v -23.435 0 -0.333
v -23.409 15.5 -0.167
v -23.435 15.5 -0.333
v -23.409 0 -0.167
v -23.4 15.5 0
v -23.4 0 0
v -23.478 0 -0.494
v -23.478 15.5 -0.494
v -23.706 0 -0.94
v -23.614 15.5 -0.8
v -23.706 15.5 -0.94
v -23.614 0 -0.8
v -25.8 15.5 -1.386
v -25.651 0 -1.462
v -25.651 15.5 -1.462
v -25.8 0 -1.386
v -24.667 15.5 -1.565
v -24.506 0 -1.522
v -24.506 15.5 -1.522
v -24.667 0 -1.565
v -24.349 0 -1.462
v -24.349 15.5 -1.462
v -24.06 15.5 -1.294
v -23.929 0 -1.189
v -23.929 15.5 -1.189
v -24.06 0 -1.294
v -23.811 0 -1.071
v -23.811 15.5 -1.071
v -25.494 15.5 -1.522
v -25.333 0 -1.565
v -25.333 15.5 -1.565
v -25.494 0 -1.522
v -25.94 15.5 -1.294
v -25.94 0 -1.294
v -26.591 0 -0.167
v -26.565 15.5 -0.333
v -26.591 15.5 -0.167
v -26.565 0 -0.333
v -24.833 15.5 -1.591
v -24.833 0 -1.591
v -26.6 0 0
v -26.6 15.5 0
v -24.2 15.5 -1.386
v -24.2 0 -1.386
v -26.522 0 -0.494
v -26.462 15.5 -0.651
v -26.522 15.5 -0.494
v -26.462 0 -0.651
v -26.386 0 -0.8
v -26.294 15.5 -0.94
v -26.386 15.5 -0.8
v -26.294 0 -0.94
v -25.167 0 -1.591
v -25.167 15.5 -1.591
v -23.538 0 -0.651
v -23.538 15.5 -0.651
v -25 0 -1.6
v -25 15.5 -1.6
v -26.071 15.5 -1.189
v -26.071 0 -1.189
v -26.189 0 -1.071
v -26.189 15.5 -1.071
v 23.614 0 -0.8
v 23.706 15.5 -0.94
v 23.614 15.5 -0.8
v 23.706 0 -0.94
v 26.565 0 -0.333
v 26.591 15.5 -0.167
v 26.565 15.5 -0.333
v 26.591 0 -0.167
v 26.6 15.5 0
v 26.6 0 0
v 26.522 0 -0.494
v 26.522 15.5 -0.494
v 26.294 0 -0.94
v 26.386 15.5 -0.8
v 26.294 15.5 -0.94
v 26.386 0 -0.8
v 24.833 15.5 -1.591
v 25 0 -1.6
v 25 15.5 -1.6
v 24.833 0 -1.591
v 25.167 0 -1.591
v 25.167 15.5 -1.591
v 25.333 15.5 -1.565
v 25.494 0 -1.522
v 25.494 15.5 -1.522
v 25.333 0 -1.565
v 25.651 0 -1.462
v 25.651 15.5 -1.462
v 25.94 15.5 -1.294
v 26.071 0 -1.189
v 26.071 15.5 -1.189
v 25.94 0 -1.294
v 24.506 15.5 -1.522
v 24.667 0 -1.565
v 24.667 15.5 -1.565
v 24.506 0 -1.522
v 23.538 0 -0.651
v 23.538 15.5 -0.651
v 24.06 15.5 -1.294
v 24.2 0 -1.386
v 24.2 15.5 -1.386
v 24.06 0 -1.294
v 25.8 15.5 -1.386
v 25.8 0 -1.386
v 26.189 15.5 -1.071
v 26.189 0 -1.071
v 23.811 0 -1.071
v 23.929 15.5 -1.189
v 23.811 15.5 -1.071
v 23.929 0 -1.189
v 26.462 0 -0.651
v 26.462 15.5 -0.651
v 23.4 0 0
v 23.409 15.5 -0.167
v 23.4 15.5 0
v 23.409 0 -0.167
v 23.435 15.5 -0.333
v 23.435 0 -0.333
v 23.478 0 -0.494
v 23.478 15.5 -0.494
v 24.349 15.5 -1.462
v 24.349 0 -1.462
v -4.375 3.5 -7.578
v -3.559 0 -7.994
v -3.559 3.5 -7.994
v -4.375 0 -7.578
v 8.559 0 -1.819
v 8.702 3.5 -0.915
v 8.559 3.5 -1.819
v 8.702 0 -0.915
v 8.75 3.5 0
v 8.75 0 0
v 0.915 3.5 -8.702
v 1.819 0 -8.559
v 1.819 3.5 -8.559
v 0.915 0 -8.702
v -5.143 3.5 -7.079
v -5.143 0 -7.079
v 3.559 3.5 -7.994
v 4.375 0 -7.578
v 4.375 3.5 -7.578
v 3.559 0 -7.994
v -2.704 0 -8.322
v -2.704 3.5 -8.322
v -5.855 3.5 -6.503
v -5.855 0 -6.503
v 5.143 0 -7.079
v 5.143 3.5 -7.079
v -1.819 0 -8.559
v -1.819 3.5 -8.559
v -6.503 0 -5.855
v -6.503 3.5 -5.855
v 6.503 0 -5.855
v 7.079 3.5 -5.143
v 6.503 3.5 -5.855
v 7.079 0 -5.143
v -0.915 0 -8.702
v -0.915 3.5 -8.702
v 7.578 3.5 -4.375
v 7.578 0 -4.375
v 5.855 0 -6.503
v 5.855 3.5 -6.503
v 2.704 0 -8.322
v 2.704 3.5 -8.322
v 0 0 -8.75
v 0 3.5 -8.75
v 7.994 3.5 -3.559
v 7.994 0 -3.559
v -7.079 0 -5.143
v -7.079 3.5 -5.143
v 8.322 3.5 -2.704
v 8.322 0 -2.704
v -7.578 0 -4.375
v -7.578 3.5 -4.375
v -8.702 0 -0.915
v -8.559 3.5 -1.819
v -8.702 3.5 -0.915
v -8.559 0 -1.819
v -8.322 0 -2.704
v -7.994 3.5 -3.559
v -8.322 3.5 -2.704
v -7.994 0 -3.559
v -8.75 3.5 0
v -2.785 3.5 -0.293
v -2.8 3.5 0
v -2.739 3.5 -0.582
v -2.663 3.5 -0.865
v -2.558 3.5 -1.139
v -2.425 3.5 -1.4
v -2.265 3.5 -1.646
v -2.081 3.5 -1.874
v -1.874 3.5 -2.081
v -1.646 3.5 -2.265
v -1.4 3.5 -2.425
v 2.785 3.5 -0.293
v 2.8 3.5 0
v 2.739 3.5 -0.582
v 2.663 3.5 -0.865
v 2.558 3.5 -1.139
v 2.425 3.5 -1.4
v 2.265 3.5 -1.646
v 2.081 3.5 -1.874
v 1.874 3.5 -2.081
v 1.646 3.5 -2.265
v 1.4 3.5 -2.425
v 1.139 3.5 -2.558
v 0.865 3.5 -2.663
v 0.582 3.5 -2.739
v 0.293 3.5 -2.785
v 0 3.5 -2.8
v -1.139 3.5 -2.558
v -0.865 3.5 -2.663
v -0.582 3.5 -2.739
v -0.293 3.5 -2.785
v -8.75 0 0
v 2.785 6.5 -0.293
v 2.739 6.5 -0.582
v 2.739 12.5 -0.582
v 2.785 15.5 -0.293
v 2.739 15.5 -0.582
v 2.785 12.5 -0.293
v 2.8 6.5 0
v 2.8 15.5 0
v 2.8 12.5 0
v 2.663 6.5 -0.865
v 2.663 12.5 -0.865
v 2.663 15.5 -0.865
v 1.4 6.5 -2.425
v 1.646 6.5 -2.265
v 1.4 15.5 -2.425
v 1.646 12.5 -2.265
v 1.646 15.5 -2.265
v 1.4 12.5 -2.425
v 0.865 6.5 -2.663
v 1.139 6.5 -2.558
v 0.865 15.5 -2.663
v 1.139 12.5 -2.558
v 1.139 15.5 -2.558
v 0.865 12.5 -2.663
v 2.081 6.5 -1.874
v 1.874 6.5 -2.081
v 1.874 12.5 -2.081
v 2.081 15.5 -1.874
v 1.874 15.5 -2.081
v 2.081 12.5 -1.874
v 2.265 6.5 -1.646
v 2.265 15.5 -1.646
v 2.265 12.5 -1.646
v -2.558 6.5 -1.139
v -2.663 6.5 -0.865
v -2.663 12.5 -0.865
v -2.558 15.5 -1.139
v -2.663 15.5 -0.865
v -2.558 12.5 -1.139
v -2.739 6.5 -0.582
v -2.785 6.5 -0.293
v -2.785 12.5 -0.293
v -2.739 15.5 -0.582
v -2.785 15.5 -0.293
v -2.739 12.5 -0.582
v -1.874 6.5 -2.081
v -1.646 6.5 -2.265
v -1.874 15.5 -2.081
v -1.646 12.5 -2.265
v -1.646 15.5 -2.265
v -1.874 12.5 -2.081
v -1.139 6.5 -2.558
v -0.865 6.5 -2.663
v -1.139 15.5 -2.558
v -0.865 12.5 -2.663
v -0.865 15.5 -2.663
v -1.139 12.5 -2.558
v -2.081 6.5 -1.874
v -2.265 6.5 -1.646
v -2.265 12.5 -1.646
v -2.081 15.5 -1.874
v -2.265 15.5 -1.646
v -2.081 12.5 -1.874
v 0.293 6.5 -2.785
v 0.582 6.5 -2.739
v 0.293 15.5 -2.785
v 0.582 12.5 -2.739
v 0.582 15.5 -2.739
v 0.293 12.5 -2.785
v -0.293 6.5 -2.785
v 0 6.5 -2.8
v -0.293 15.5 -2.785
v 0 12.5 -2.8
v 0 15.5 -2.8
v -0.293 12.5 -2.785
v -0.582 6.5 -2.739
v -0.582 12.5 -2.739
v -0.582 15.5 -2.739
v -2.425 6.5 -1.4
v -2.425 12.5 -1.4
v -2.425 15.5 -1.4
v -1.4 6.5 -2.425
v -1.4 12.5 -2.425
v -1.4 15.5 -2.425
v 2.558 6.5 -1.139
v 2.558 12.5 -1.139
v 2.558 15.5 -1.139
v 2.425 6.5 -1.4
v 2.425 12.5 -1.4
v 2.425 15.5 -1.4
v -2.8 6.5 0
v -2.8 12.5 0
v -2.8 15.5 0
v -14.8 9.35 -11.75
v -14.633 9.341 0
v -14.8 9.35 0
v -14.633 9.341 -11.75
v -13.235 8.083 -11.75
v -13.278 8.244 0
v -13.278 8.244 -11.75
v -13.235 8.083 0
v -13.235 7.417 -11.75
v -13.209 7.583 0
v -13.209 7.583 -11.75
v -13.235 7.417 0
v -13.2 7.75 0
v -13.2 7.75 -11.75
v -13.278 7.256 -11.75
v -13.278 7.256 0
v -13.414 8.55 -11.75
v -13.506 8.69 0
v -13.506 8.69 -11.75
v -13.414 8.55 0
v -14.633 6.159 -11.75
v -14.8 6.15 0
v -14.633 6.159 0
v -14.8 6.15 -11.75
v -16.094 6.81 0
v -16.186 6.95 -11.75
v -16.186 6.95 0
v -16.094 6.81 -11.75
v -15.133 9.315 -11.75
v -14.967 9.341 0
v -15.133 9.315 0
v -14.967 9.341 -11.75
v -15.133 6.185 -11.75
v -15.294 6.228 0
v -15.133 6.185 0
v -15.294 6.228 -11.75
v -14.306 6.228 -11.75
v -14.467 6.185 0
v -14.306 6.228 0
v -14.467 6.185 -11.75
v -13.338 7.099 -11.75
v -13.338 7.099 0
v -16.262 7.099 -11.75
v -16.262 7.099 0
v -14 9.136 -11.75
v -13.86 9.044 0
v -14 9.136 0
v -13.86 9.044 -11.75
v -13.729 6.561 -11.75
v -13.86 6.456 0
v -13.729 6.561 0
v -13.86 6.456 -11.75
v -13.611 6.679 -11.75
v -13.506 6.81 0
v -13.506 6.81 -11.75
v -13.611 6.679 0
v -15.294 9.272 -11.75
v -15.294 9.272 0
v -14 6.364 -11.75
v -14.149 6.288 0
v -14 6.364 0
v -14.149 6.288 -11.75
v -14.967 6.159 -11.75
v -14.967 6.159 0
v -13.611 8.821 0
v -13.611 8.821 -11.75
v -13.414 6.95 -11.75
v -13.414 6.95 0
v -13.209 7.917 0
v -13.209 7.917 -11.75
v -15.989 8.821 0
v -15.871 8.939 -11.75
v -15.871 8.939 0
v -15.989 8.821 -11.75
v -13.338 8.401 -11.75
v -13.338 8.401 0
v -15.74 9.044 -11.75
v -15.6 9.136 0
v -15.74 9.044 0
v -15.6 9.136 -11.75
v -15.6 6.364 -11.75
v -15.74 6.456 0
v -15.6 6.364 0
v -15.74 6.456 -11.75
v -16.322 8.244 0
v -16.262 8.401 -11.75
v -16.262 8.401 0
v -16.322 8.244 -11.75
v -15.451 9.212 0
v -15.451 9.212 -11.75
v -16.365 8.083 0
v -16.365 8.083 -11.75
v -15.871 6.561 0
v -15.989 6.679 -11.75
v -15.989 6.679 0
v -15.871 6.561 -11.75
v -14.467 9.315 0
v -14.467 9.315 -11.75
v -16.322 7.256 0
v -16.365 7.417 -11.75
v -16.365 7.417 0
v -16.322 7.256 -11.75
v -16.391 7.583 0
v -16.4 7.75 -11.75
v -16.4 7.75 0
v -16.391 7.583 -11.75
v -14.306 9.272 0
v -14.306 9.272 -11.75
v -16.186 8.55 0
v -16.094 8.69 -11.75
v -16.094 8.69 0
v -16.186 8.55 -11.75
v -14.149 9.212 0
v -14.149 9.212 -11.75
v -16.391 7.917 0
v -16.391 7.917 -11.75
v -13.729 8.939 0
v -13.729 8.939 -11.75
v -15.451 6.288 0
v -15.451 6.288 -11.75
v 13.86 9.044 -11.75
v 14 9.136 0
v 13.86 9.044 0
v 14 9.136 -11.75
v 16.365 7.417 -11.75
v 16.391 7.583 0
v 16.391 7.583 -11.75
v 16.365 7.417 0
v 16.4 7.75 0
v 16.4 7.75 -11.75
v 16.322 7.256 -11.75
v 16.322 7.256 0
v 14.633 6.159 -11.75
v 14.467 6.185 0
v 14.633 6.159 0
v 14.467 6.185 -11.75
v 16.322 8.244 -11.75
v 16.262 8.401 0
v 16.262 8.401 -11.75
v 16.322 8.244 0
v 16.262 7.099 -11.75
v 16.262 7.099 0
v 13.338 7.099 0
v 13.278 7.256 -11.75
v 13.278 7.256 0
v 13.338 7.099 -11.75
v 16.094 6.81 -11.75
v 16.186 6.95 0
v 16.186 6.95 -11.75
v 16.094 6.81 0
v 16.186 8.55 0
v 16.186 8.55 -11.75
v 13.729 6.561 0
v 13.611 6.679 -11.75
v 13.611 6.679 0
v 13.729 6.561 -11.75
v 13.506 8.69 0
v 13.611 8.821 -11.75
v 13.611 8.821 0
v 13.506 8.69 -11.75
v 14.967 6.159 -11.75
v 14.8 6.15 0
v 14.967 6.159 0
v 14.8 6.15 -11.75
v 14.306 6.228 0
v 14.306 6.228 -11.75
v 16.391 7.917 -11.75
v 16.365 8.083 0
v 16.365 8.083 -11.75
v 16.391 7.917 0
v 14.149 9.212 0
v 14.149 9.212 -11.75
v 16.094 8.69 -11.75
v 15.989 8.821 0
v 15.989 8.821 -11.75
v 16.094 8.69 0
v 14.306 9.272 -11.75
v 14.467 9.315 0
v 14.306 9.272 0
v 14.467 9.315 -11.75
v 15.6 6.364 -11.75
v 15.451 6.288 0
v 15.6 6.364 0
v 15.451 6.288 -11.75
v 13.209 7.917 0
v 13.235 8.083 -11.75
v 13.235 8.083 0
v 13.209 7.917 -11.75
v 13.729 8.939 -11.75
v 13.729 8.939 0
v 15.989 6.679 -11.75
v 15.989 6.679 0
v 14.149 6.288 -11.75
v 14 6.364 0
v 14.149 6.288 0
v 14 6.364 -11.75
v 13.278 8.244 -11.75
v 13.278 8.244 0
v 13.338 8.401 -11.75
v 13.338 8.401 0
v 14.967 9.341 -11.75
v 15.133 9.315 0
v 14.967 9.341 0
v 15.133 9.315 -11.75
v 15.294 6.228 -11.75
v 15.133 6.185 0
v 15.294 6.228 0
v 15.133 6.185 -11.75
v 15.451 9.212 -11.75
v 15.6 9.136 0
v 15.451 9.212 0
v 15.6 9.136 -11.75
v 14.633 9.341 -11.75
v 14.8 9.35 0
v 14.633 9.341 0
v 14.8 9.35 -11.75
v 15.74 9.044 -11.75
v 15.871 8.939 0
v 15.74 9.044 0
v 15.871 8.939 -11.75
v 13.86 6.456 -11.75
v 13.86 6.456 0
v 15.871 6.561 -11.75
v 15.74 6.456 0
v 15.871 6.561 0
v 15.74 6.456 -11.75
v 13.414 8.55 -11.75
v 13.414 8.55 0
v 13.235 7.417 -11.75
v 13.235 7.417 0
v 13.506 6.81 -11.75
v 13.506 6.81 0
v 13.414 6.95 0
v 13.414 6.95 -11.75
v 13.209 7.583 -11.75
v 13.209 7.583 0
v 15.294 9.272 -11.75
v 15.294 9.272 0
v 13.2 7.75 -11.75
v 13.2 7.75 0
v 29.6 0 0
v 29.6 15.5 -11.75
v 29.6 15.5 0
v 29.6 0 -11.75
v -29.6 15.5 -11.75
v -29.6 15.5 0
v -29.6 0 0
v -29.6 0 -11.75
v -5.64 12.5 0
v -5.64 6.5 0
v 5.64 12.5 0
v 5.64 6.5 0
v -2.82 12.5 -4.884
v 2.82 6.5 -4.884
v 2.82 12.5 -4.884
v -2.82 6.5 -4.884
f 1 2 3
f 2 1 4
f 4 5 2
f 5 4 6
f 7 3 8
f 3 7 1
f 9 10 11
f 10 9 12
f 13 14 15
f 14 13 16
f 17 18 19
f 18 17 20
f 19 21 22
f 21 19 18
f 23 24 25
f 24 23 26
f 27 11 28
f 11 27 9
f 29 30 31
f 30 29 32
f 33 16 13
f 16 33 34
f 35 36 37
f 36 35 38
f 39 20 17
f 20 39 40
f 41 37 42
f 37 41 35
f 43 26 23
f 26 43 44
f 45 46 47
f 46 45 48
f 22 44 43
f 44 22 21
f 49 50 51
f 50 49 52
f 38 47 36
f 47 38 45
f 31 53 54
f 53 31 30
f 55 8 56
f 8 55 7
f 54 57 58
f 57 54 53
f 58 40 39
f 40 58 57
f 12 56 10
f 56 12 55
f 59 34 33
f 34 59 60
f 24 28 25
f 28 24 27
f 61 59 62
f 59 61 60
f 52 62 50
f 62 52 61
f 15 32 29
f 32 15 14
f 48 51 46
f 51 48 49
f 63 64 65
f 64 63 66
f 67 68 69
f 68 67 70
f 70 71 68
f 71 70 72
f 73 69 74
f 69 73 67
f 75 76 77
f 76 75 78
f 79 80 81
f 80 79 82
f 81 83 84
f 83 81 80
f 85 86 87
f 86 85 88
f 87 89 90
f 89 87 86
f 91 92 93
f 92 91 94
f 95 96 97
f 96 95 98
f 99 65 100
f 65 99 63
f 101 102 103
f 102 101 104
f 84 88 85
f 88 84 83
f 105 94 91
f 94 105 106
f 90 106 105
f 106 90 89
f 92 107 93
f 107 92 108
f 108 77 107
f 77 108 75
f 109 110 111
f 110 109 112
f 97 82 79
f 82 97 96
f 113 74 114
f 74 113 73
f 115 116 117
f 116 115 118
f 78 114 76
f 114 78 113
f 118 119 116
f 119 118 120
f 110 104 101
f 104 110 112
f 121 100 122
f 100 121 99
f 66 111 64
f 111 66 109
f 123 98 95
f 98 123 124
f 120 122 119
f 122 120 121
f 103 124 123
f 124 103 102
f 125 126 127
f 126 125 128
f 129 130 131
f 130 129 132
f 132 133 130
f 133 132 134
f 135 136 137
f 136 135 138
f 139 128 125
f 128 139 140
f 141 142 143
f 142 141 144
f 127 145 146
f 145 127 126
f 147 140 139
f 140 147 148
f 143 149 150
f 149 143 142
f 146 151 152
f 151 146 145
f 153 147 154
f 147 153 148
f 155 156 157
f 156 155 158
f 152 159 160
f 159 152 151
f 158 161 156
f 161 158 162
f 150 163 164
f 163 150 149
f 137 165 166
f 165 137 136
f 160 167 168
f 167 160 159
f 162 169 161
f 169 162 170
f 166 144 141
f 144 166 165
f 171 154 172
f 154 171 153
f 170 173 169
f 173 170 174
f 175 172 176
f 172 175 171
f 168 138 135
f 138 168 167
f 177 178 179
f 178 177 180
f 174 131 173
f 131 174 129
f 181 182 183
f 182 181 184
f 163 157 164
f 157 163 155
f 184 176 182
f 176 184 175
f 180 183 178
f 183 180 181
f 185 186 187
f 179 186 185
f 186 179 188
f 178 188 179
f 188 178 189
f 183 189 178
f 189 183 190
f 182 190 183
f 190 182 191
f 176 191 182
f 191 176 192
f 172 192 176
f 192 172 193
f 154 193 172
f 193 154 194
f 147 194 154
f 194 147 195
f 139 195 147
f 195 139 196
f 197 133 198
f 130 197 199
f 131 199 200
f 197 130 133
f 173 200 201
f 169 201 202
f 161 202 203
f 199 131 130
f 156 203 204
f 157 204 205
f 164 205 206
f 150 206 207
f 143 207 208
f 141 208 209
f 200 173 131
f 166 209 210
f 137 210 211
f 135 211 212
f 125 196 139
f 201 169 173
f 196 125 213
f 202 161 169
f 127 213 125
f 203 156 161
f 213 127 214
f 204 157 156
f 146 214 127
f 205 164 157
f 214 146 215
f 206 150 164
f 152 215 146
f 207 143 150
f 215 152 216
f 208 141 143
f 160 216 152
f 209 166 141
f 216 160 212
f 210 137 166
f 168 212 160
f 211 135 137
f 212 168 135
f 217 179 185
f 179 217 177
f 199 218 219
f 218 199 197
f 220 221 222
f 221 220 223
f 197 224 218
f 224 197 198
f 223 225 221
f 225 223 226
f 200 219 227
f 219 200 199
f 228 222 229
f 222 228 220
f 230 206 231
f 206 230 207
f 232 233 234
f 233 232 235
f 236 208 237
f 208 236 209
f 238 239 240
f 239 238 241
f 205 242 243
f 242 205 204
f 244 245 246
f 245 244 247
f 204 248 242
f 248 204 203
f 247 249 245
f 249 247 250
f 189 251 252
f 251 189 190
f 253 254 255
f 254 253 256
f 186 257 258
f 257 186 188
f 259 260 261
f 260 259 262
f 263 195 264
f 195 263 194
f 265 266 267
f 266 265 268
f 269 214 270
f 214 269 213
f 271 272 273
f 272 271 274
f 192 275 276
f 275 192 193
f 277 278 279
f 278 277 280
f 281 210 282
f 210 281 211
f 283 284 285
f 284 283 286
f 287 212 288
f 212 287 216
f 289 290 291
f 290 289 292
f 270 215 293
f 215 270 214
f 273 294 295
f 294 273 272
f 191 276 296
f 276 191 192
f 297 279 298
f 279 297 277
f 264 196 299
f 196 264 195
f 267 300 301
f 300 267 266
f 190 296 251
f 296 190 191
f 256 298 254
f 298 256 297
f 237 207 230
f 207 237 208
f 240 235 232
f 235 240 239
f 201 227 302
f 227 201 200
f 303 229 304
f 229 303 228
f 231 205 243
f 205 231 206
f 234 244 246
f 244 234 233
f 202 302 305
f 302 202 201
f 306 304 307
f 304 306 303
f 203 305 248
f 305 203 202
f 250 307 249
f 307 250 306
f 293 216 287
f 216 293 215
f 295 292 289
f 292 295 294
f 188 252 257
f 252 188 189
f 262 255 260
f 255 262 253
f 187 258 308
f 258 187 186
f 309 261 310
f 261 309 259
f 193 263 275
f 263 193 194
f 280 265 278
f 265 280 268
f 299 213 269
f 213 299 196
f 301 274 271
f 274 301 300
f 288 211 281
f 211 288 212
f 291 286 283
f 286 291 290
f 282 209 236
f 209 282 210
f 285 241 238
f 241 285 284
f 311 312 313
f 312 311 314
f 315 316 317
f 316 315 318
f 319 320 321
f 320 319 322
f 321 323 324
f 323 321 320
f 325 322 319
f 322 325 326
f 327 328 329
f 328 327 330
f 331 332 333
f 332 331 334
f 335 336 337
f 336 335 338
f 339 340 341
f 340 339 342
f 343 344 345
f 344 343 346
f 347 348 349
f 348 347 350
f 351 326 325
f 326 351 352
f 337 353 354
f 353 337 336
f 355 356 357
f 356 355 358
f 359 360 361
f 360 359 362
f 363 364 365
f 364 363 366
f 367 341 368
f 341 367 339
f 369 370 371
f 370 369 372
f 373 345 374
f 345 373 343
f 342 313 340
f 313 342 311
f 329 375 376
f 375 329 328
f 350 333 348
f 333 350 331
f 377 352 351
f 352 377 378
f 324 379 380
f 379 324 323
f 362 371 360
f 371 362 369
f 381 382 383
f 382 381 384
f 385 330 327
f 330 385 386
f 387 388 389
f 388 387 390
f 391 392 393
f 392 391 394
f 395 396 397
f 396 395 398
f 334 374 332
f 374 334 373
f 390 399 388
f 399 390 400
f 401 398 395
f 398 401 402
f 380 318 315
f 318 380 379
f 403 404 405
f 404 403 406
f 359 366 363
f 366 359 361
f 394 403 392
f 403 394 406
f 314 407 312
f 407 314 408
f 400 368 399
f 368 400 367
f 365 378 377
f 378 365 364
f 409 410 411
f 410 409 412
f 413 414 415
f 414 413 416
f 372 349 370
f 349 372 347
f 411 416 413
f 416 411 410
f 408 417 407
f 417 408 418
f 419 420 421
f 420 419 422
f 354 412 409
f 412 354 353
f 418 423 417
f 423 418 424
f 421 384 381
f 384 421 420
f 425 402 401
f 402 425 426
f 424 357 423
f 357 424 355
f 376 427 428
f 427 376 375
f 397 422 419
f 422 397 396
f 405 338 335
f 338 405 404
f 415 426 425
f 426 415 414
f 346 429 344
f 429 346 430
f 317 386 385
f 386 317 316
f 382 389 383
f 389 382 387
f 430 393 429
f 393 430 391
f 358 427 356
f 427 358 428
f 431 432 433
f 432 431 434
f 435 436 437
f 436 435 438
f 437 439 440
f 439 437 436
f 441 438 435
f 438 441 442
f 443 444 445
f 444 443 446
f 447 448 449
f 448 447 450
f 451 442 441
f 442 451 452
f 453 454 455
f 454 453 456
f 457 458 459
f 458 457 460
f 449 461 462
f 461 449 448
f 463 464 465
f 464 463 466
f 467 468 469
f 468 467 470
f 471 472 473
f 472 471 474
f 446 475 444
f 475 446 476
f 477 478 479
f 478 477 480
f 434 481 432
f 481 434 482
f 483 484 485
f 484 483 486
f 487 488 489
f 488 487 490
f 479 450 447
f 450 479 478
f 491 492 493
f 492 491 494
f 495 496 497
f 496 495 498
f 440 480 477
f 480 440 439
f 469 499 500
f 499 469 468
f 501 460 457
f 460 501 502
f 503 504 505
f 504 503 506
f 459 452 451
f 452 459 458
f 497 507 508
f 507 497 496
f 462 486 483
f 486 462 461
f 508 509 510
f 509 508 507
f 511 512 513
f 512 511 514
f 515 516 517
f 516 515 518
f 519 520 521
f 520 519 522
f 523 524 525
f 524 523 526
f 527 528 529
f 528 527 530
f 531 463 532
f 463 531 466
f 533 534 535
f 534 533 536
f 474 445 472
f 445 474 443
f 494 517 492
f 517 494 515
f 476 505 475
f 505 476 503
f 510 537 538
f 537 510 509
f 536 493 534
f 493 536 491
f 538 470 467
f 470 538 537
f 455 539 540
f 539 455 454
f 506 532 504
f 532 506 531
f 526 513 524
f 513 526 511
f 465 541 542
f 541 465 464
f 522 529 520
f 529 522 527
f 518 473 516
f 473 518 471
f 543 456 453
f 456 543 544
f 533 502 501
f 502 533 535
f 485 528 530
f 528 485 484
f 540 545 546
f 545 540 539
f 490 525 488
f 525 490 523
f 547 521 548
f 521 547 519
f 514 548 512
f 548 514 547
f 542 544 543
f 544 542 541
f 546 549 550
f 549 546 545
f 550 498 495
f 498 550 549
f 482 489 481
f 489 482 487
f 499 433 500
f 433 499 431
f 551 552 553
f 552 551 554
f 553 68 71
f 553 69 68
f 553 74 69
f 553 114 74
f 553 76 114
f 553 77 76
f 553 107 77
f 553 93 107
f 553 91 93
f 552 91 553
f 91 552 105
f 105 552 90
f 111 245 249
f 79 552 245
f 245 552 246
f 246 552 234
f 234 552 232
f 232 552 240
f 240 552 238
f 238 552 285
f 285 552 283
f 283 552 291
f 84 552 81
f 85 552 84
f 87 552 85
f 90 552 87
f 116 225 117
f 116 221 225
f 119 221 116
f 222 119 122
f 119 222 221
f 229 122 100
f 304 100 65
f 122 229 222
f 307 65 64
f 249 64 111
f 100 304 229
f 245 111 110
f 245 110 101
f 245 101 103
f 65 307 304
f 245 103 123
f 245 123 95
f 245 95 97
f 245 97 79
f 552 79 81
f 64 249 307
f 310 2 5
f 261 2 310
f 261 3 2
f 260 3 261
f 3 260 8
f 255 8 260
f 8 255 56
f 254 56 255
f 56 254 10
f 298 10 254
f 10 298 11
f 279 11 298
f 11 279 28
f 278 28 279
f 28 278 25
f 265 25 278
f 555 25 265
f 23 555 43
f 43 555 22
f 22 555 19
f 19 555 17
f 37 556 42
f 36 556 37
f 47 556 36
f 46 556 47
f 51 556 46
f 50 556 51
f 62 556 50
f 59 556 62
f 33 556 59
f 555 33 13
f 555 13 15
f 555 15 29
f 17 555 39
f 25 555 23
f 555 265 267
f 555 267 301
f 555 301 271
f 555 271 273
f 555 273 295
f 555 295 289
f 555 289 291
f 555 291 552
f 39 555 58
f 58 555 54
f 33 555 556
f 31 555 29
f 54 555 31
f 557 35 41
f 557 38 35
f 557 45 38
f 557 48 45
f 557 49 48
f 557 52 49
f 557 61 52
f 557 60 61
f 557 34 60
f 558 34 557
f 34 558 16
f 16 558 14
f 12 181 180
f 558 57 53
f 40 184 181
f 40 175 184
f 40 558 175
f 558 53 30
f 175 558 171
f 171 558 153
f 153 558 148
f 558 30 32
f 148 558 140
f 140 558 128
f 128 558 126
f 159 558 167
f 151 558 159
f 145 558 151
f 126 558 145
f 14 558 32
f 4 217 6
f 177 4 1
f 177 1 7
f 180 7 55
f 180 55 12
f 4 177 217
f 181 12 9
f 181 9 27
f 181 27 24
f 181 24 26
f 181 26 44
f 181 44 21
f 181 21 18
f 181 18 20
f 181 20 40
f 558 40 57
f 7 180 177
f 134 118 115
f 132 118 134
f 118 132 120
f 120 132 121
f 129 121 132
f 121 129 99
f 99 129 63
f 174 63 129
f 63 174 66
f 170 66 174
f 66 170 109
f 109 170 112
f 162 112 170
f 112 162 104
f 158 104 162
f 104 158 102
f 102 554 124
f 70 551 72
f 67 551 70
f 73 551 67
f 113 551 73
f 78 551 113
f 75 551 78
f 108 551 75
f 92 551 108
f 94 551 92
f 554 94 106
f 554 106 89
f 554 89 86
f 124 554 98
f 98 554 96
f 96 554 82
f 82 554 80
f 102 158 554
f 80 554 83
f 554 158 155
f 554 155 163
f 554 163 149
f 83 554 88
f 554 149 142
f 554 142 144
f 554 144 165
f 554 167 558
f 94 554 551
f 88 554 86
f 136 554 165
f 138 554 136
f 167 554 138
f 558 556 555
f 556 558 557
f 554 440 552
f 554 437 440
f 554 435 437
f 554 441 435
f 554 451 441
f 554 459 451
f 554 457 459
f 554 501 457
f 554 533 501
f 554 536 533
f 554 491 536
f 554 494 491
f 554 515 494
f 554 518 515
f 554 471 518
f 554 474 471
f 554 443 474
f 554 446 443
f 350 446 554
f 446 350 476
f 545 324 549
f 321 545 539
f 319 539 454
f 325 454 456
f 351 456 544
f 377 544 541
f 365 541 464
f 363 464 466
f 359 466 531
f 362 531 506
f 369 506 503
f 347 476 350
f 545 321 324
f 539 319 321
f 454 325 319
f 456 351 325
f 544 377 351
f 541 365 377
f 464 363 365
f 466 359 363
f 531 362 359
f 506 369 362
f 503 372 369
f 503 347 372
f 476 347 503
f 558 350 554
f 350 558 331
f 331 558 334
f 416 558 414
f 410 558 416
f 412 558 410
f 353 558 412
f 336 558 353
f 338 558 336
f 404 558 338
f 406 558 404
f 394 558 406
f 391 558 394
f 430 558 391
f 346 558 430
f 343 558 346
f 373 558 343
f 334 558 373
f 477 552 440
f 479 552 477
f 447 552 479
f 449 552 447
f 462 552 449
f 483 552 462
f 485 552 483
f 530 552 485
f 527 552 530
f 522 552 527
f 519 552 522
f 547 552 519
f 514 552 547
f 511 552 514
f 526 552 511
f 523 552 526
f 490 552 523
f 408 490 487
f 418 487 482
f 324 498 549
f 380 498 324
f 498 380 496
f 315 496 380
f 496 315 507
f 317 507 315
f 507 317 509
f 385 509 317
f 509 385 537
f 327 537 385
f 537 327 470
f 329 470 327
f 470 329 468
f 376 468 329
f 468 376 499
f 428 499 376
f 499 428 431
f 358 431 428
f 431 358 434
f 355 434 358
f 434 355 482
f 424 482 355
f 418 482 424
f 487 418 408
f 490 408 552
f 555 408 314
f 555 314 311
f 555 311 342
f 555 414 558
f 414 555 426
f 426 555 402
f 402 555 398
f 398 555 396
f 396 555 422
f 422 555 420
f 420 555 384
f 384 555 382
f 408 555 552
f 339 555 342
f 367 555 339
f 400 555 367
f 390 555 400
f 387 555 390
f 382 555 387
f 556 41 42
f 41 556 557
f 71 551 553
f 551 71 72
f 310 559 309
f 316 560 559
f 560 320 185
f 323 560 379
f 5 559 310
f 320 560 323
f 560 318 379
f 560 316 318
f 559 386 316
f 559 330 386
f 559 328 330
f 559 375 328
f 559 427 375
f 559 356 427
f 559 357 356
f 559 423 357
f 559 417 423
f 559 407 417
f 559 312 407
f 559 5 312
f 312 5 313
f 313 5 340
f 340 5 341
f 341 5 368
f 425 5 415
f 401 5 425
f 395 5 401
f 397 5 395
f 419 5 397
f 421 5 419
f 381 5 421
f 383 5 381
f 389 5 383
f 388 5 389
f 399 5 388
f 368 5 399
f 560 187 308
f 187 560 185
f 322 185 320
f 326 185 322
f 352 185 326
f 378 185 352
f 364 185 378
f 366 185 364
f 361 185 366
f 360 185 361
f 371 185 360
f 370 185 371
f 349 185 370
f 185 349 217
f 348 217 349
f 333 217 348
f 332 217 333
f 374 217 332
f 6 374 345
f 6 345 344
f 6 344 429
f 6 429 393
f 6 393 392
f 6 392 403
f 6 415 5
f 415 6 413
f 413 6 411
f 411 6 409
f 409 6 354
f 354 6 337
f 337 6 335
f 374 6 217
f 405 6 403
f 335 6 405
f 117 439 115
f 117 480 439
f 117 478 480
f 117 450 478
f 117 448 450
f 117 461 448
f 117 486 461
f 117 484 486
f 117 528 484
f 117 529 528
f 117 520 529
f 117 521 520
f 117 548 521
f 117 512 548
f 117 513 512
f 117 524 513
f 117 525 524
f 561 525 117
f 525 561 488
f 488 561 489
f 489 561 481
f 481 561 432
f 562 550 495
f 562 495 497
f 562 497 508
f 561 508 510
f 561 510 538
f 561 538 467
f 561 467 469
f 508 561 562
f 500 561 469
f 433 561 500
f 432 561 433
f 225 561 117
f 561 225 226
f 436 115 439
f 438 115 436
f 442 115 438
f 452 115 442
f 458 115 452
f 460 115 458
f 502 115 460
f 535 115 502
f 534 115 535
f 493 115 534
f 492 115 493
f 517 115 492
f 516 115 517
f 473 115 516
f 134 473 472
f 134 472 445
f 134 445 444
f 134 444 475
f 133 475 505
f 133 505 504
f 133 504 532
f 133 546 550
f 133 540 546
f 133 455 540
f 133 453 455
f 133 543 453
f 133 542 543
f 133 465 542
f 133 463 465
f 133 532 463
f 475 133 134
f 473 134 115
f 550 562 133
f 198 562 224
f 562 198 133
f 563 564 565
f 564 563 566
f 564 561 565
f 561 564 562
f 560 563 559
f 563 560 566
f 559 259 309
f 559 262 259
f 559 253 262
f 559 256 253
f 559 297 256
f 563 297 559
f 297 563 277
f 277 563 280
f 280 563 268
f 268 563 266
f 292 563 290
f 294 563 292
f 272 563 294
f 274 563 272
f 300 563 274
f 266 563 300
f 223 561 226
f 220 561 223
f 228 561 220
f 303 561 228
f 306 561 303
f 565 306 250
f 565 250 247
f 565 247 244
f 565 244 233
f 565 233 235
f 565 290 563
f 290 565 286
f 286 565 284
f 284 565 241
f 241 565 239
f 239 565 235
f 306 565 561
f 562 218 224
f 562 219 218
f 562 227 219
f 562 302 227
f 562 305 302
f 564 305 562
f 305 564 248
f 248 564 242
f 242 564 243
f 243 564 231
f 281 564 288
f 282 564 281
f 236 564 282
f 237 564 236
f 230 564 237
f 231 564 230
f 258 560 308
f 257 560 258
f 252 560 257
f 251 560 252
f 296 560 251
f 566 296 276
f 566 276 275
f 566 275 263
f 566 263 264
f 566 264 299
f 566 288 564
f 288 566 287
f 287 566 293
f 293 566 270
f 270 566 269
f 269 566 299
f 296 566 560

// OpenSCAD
/*
 * TVRRUG hotend cable mount
 *
 * Copyright 2012 <b@Zi.iS>
 * License CC BY 3.0
 */

/*
 * Serendipitously you can just run an M6 nyloc nut onto the end of the PTFE
 * tube for a perfect grip
 */

$fn = 60;

m3 = 3.2 /2;
m6_nyloc = [
	11.28 /2,
	6
];

rotate([
	-90,
	0,
	0
]) {
	mount();
}

module mount(
	bolt = m3,
	pitch = 50,
	bowden = 5.6/2,
	bowden_nut = m6_nyloc,
	hotend = [17.5/2, 3.5],
	t = 3
) {
	size = [
		pitch + bolt*2 + t*2,
		hotend[0]*2 + t*2,
		hotend[1] + bowden_nut[1] + t*2
	];

	difference() {
		translate([
			-size[0]/2,
			0,
			0
		]) {
			cube([
				size[0],
				size[1]/2,
				size[2]
			]);
		}

		//bowden nut	
		translate([
			0,
			0,
			hotend[1] + t
		]) {
			cylinder(
				r = bowden_nut[0],
				h = bowden_nut[1],
				$fn = 6
			);
		}
	
		translate([
			0,
			0,
			-1
		]) {
			//hotend
			cylinder(
				r = hotend[0],
				h = hotend[1]+1
			);
			//bowden
			cylinder(
				r = bowden,
				h = size[2]+2
			);

			//x-carrage bolts
			for(x=[0:1]) {
				translate([
					-pitch/2 + x*pitch,
					0,
					0
				]) {
					cylinder(
						r = bolt,
						h = size[2]+2
					);
				}
			}
		}

		//bolts
		for(x=[0:1]){
			translate([
				-size[0]/4 + size[0]/2*x,
				-1,
				size[2]/2
			]) {
				rotate([
					-90,
					0,
					0
				]) {
					cylinder(
						r = bolt,
						h = size[1]
					);
				}
			}
		}
	}
}	
